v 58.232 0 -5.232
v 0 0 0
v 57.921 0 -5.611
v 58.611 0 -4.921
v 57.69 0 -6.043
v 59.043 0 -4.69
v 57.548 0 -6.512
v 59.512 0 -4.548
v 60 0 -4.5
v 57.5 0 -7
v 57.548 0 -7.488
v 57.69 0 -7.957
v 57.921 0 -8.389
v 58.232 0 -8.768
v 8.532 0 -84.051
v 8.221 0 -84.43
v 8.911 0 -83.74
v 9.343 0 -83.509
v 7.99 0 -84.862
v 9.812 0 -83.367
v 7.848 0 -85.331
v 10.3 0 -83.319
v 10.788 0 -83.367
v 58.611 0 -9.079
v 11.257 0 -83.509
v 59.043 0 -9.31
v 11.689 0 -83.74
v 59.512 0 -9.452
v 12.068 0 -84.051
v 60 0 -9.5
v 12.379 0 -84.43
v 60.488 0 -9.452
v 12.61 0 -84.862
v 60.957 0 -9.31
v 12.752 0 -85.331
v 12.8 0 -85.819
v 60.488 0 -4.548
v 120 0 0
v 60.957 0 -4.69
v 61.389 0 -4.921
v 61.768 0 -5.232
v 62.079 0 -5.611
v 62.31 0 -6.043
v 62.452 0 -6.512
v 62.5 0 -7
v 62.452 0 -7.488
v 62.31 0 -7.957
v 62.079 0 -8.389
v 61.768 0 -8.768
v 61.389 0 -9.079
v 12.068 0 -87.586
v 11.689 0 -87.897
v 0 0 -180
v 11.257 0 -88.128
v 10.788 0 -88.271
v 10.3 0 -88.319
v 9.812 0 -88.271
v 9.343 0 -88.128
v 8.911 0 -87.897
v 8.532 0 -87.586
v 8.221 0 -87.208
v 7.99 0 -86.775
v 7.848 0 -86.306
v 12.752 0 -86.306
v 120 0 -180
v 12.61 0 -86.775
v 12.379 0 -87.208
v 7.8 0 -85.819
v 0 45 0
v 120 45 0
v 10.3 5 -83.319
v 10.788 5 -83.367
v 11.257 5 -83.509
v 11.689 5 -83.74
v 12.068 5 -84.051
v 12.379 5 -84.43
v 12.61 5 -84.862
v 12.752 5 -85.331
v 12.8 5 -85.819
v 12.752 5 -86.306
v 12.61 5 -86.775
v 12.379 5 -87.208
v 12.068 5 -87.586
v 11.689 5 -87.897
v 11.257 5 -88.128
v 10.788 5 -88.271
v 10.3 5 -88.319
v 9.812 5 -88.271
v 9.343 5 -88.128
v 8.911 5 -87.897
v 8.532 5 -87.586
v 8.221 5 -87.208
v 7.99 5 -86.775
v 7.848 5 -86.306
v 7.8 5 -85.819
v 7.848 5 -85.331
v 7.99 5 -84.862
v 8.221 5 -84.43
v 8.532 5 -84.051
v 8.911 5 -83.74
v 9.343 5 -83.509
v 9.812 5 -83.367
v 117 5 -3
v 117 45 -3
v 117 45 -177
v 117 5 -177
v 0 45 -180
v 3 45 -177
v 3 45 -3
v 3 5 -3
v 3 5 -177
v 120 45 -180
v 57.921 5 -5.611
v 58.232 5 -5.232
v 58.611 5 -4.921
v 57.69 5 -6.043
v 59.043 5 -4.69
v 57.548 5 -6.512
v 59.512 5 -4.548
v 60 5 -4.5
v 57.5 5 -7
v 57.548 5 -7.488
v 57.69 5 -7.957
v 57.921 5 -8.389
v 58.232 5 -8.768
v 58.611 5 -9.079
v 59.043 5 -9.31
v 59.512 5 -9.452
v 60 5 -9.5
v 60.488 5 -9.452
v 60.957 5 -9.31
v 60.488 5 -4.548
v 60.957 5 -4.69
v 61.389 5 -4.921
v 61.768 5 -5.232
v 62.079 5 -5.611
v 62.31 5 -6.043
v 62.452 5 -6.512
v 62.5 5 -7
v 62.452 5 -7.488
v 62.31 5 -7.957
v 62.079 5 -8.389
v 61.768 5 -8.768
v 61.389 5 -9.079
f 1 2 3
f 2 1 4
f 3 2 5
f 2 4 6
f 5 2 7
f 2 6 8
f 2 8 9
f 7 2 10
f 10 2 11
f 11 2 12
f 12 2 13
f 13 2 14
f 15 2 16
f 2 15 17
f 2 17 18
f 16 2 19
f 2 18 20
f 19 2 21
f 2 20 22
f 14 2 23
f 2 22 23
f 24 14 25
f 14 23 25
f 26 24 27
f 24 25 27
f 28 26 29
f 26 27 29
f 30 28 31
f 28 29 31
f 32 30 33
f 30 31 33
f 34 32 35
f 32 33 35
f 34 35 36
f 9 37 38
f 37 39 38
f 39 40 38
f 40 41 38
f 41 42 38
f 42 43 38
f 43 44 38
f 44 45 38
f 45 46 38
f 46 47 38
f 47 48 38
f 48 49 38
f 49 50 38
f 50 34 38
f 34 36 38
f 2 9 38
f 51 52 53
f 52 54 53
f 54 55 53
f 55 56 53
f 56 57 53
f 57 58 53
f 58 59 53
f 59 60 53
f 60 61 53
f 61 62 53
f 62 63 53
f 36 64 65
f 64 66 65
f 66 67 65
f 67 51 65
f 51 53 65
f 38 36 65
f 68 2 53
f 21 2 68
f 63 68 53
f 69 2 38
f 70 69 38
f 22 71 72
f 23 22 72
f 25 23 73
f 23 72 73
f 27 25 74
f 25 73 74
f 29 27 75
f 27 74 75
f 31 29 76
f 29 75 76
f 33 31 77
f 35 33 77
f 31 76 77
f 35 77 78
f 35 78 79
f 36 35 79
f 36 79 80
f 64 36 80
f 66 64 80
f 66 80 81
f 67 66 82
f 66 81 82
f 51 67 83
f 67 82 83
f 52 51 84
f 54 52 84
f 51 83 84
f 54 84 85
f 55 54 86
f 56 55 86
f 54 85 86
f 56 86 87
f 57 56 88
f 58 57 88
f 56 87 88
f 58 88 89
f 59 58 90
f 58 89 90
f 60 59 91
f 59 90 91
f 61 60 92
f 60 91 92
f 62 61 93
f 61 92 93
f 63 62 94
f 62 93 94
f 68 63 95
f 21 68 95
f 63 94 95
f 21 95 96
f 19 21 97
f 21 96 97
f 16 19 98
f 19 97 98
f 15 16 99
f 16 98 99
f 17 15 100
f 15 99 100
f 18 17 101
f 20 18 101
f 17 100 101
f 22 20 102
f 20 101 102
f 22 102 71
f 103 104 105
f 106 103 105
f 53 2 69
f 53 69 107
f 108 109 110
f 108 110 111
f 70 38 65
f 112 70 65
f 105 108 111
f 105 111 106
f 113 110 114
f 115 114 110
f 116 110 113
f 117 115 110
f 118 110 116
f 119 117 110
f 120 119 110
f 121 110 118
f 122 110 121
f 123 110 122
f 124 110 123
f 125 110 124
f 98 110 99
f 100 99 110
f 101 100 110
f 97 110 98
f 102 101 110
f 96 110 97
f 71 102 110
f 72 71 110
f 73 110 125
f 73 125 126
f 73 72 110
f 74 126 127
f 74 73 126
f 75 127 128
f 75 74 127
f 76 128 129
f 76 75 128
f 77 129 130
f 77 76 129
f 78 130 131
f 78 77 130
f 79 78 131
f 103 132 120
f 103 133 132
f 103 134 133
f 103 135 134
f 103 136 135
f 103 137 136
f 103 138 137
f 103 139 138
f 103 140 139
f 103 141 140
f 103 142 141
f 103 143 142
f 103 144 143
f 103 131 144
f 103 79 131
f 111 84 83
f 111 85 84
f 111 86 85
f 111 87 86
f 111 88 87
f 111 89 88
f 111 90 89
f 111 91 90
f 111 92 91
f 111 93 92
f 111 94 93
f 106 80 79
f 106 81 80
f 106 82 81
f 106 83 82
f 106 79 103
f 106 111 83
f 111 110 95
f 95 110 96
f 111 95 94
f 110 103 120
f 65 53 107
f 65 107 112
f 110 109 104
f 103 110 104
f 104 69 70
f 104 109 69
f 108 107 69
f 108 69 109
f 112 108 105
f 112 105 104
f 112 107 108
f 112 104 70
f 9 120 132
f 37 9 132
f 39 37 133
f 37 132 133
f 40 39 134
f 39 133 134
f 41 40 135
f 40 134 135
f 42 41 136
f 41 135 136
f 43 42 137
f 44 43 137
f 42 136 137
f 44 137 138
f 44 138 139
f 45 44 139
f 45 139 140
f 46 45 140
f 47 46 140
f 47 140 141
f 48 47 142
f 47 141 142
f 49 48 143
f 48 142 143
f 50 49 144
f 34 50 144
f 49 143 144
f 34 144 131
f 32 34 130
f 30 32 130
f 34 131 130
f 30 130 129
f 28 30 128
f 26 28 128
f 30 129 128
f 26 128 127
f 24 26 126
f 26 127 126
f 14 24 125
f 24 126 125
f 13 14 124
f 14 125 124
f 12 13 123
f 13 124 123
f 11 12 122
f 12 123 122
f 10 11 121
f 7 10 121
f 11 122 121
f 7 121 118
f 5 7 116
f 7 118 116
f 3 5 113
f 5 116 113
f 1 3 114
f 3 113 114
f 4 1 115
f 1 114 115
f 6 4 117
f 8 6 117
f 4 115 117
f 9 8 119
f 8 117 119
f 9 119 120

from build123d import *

# Parameters (mm, degrees)
SKETCH1_W           = 120
SKETCH1_H           = 180
BOSS_EXTRUDE1_DEPTH = 45
SKETCH3_W           = 114
SKETCH3_H           = 174
CUT_EXTRUDE1_DEPTH  = 40
SKETCH4_R           = 2.5
CUT_EXTRUDE2_DEPTH  = 5


with BuildPart() as part:
    # Sketch1 → Boss-Extrude1 (new body)
    with BuildSketch(Plane(origin=(0, 0, 0), x_dir=(1, 0, 0), z_dir=(0, 1, 0))):
        with Locations((60, 90)):
            Rectangle(SKETCH1_W, SKETCH1_H)
    extrude(amount=BOSS_EXTRUDE1_DEPTH)

    # Sketch3 → Cut-Extrude1 (cut)
    with BuildSketch(Plane(origin=(0, 45, 0), x_dir=(1, 0, 0), z_dir=(0, 1, 0))):
        with Locations((60, 90)):
            Rectangle(SKETCH3_W, SKETCH3_H)
    extrude(amount=-CUT_EXTRUDE1_DEPTH, mode=Mode.SUBTRACT)

    # Sketch4 → Cut-Extrude2 (cut)
    with BuildSketch(Plane(origin=(0, 5, 0), x_dir=(1, 0, 0), z_dir=(0, 1, 0))):
        with Locations(Location((10.3, 85.818636822, 0), (0, 0, 270))):
            Circle(SKETCH4_R)
        with Locations(Location((60, 7, 0), (0, 0, 270))):
            Circle(SKETCH4_R)
    extrude(amount=-CUT_EXTRUDE2_DEPTH, mode=Mode.SUBTRACT)


solid = part.part
